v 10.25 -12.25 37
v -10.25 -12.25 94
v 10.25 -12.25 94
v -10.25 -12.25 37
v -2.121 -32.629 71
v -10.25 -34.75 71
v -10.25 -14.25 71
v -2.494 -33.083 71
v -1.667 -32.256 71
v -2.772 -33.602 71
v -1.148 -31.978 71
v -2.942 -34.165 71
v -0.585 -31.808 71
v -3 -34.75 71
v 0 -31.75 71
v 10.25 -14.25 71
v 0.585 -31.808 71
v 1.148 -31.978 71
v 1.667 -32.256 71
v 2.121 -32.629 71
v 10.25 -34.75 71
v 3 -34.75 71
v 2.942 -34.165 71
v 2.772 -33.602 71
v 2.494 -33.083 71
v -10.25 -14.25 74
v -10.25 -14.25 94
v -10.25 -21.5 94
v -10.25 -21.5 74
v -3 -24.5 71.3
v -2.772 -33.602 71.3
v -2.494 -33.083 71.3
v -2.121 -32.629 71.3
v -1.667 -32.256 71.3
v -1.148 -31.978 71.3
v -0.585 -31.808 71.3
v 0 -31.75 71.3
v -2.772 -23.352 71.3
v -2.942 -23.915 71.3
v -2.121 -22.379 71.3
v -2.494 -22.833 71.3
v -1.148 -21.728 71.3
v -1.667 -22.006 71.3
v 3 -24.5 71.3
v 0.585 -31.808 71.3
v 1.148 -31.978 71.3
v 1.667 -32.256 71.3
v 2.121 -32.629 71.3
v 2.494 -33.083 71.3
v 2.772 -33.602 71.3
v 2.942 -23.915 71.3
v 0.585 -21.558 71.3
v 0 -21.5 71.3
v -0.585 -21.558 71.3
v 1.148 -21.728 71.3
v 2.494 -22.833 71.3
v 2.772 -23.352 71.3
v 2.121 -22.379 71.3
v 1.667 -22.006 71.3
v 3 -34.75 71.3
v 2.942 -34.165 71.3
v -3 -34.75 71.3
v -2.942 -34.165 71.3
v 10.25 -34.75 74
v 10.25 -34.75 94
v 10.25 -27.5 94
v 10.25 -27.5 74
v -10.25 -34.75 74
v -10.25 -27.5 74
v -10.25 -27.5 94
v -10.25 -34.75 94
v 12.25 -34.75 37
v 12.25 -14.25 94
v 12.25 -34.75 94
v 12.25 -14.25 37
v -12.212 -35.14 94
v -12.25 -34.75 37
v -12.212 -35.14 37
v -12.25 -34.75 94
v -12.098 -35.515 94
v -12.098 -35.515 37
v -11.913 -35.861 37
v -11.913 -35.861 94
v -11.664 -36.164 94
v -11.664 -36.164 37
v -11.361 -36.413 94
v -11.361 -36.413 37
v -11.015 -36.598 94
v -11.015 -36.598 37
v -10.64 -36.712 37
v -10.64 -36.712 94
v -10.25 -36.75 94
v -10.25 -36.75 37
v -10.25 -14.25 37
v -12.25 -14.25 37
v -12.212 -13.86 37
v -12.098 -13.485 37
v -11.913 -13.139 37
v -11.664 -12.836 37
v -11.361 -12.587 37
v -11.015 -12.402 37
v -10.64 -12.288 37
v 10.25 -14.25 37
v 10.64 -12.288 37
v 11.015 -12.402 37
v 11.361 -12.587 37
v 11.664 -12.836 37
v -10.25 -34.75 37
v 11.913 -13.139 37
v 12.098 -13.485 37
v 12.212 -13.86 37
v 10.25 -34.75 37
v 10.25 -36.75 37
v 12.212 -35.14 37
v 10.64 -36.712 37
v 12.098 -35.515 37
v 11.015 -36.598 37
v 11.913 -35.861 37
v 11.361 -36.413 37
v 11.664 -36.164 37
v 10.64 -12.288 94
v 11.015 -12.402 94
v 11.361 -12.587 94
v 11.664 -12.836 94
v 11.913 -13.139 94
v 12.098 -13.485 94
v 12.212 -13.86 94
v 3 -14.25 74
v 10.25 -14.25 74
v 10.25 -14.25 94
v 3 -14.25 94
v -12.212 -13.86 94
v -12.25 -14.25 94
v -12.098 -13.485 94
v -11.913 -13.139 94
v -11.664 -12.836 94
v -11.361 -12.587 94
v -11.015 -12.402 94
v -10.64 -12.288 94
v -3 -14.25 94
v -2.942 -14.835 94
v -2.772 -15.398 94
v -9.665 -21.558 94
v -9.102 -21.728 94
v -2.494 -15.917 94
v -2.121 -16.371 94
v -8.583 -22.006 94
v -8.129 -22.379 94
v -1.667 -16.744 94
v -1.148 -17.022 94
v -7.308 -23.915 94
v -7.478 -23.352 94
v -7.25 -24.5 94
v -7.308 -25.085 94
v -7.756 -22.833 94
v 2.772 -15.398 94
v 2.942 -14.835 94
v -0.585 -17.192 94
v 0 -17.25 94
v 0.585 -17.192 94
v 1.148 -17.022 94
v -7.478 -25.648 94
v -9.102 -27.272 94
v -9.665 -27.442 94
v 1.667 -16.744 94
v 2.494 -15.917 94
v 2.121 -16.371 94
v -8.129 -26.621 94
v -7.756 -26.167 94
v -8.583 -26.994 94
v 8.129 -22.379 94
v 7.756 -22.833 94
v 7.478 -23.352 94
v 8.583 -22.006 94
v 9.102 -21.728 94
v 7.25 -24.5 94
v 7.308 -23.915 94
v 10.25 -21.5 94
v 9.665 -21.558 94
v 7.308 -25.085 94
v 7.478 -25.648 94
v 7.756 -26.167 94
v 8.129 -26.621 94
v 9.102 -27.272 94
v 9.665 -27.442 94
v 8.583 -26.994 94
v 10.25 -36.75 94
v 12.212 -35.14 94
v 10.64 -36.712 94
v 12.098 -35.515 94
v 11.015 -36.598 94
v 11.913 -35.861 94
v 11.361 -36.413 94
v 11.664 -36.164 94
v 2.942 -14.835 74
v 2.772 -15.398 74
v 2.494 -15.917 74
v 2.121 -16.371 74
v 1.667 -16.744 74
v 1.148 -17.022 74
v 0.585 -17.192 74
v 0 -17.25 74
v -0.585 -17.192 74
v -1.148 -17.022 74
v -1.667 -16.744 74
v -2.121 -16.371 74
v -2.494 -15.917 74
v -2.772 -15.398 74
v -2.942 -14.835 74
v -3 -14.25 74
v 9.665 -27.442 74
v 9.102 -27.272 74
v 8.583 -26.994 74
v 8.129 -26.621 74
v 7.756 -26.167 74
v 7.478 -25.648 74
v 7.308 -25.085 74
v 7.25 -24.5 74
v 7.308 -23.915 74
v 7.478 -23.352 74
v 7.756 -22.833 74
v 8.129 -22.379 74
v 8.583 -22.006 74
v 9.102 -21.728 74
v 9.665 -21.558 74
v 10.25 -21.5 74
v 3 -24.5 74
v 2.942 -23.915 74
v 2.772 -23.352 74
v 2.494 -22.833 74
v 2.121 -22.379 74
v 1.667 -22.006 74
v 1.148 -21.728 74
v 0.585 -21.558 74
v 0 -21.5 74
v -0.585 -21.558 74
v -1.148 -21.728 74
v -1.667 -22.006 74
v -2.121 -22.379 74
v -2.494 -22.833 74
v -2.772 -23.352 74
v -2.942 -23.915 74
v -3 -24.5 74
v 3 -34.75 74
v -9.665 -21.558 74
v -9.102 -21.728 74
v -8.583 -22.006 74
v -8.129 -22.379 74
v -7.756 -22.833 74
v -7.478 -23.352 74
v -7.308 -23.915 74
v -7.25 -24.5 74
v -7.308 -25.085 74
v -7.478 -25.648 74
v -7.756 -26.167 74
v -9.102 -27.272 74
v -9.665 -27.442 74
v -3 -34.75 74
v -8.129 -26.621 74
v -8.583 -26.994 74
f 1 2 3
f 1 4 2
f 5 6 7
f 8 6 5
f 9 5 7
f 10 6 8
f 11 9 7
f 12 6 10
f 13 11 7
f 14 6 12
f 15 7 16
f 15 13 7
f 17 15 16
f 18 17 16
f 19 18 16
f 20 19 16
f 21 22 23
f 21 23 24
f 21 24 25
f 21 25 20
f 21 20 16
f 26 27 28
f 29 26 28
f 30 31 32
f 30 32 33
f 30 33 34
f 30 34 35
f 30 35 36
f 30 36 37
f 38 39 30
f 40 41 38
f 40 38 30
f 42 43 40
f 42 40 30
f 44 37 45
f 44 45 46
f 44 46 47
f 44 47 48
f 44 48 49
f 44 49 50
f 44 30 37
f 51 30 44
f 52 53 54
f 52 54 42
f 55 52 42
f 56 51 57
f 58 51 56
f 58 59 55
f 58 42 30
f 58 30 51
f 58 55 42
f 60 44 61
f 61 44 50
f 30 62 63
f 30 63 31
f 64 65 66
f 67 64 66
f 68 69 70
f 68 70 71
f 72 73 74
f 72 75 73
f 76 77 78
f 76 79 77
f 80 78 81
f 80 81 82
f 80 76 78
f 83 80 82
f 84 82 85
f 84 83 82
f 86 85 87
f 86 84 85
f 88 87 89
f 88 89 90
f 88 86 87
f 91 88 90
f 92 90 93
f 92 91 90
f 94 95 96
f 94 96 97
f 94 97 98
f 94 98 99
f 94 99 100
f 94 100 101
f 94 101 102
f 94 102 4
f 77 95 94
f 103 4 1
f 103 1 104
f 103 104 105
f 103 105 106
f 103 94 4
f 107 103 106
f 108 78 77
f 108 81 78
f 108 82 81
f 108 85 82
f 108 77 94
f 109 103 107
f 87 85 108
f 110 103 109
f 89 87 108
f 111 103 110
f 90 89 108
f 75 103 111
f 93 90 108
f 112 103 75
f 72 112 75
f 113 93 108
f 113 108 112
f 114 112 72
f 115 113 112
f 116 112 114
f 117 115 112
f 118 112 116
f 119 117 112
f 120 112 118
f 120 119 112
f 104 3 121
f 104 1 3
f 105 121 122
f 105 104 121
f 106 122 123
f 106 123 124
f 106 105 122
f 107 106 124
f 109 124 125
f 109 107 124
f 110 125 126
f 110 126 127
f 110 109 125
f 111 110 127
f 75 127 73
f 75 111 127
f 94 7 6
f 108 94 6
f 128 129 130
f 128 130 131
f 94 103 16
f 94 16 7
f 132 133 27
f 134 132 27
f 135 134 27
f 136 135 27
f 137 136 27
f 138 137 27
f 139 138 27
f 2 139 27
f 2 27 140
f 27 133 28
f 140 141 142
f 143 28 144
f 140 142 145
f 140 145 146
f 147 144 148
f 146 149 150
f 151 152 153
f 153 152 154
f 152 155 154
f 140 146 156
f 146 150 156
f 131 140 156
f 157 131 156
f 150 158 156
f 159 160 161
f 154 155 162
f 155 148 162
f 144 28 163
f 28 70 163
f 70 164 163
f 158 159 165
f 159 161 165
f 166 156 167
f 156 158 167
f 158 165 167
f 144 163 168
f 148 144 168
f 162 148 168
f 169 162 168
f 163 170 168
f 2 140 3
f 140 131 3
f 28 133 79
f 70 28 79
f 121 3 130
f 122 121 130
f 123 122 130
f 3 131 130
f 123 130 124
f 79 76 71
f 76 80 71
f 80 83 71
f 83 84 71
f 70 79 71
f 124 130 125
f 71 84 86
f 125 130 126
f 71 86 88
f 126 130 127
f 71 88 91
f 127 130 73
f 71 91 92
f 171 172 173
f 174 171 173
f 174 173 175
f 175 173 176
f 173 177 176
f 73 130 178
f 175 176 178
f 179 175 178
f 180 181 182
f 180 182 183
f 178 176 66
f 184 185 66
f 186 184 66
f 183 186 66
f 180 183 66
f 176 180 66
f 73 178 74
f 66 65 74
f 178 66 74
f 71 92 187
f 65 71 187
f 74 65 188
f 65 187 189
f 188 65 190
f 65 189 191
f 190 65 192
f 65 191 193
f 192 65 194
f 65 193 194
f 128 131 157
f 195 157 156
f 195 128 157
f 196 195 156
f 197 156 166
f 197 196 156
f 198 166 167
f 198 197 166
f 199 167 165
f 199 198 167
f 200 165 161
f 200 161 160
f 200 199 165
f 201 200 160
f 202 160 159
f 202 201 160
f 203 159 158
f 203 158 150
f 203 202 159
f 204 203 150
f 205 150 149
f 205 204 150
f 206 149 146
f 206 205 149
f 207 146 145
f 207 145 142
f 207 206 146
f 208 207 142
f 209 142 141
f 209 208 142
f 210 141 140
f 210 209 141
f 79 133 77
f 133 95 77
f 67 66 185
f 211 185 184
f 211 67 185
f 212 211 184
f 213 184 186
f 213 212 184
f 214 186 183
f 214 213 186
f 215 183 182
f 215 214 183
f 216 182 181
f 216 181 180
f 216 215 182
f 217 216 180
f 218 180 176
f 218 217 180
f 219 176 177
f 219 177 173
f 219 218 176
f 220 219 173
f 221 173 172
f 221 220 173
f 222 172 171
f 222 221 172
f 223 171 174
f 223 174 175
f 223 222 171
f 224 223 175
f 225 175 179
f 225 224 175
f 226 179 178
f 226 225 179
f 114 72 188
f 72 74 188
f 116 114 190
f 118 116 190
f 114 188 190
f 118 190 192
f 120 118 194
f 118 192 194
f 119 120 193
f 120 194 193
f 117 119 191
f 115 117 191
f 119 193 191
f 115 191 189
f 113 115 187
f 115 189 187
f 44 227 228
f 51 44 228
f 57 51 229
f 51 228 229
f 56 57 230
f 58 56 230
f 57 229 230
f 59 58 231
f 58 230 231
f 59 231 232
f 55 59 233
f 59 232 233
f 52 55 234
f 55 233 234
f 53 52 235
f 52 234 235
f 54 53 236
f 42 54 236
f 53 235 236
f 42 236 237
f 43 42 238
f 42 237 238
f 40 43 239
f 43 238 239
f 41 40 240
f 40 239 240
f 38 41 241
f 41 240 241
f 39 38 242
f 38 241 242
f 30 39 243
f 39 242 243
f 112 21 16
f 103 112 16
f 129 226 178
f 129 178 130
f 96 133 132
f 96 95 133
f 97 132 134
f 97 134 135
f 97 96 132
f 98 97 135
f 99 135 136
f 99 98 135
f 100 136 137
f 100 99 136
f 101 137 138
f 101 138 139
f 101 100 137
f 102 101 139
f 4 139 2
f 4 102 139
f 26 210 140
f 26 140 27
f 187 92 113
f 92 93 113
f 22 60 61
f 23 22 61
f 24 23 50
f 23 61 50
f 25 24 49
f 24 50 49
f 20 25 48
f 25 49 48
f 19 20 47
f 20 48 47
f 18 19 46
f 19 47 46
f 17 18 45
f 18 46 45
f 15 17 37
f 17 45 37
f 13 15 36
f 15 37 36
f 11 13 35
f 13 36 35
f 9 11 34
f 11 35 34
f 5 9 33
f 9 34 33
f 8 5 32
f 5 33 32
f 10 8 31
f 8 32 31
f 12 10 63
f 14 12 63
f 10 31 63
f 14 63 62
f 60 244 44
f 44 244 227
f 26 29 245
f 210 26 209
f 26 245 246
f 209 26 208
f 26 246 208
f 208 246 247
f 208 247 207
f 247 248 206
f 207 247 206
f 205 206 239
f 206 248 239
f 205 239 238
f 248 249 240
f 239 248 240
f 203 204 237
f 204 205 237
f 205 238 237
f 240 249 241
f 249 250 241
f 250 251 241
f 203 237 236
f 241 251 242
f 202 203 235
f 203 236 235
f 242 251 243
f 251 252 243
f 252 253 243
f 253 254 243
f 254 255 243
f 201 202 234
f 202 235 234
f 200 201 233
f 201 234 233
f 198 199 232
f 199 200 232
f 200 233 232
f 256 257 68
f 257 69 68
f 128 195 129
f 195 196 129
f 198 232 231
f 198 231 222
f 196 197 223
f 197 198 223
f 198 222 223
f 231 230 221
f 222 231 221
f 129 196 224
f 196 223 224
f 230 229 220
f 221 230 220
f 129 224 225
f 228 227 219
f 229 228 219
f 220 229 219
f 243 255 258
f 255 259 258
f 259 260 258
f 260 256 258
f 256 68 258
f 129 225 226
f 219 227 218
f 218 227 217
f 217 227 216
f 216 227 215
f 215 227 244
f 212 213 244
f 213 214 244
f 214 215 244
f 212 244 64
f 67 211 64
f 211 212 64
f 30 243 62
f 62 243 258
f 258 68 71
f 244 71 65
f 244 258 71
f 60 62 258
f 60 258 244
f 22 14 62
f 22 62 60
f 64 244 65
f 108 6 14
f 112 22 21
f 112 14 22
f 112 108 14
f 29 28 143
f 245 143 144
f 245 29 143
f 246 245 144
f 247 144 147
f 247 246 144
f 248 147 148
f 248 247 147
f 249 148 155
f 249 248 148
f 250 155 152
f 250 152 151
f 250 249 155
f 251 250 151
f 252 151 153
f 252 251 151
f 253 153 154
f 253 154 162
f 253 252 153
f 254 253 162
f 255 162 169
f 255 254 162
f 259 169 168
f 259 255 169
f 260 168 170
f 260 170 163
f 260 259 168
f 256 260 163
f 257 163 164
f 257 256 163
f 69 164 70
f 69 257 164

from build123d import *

# Parameters (mm, degrees)
F0_W     = 24.5
F0_H     = 24.5
F1_DEPTH = 37
F2_DEPTH = 20
F3_DEPTH = 3
F5_DEPTH = 2.7
F6_R     = 2
F7_ANGLE = -180


with BuildPart() as f1:
    # F0 (on Top) → F1 (new body)
    with BuildSketch(Plane.XY):
        Rectangle(F0_W, F0_H)
        Polygon((10.25, -3), (10.25, -10.25), (3, -10.25), (-3, -10.25), (-10.25, -10.25), (-10.25, -3), (-10.25, 3), (-10.25, 10.25), (-3, 10.25), (3, 10.25), (10.25, 10.25), (10.25, 3), align=None, mode=Mode.SUBTRACT)
    extrude(amount=F1_DEPTH)

    # F0 (on Top) → F2 (join)
    with BuildSketch(Plane.XY):
        Rectangle(F0_W, F0_H)
        Polygon((10.25, -3), (10.25, -10.25), (3, -10.25), (-3, -10.25), (-10.25, -10.25), (-10.25, -3), (-10.25, 3), (-10.25, 10.25), (-3, 10.25), (3, 10.25), (10.25, 10.25), (10.25, 3), align=None, mode=Mode.SUBTRACT)
        with BuildLine():
            Line((-3, -10.25), (3, -10.25))
            ThreePointArc((3, -10.25), (0, -7.25), (-3, -10.25))
        make_face()
        with BuildLine():
            Line((-10.25, 3), (-10.25, -3))
            ThreePointArc((-10.25, -3), (-7.25, 0), (-10.25, 3))
        make_face()
        with BuildLine():
            ThreePointArc((10.25, 3), (7.25, 0), (10.25, -3))
            Line((10.25, -3), (10.25, 3))
        make_face()
    extrude(amount=-F2_DEPTH)

    # F0 (on Top) → F3 (join)
    with BuildSketch(Plane.XY):
        with BuildLine():
            Line((3, -10.25), (10.25, -10.25))
            Line((10.25, -10.25), (10.25, -3))
            ThreePointArc((10.25, -3), (7.25, 0), (10.25, 3))
            Line((10.25, 3), (10.25, 10.25))
            Line((10.25, 10.25), (3, 10.25))
            ThreePointArc((3, 10.25), (0, 7.25), (-3, 10.25))
            Line((-3, 10.25), (-10.25, 10.25))
            Line((-10.25, 10.25), (-10.25, 3))
            ThreePointArc((-10.25, 3), (-7.25, 0), (-10.25, -3))
            Line((-10.25, -3), (-10.25, -10.25))
            Line((-10.25, -10.25), (-3, -10.25))
            ThreePointArc((-3, -10.25), (0, -7.25), (3, -10.25))
        make_face()
        with BuildLine():
            Line((-10.25, 3), (-10.25, -3))
            ThreePointArc((-10.25, -3), (-7.25, 0), (-10.25, 3))
        make_face()
        with BuildLine():
            Line((-3, -10.25), (3, -10.25))
            ThreePointArc((3, -10.25), (0, -7.25), (-3, -10.25))
        make_face()
        with BuildLine():
            ThreePointArc((10.25, 3), (7.25, 0), (10.25, -3))
            Line((10.25, -3), (10.25, 3))
        make_face()
    extrude(amount=F3_DEPTH)

    # F4 (on face) → F5 (cut)
    with BuildSketch(Plane(origin=(0, 0, 0), x_dir=(1, 0, 0), z_dir=(0, 0, -1))):
        with BuildLine():
            Line((3, -10.25), (3, 0))
            ThreePointArc((3, 0), (0, -3), (-3, 0))
            Line((-3, 0), (-3, -10.25))
            ThreePointArc((-3, -10.25), (0, -7.25), (3, -10.25))
        make_face()
        with BuildLine():
            ThreePointArc((-3, 0), (0, -3), (3, 0))
            ThreePointArc((3, 0), (0, 3), (-3, 0))
        make_face()
    extrude(amount=-F5_DEPTH, mode=Mode.SUBTRACT)

    # F6
    f6_edges = [f1.edges().sort_by_distance(p)[0] for p in [
        (-12.25, -12.25, 8.5),
        (12.25, -12.25, 8.5),
        (12.25, 12.25, 8.5),
        (-12.25, 12.25, 8.5),
    ]]
    fillet(f6_edges, radius=F6_R)


with BuildPart() as f1_1:
    # F7: moved
    add(f1.part.rotate(Axis((0, -12.25, 37), (-1, 0, 0)), F7_ANGLE))


solid = f1_1.part
